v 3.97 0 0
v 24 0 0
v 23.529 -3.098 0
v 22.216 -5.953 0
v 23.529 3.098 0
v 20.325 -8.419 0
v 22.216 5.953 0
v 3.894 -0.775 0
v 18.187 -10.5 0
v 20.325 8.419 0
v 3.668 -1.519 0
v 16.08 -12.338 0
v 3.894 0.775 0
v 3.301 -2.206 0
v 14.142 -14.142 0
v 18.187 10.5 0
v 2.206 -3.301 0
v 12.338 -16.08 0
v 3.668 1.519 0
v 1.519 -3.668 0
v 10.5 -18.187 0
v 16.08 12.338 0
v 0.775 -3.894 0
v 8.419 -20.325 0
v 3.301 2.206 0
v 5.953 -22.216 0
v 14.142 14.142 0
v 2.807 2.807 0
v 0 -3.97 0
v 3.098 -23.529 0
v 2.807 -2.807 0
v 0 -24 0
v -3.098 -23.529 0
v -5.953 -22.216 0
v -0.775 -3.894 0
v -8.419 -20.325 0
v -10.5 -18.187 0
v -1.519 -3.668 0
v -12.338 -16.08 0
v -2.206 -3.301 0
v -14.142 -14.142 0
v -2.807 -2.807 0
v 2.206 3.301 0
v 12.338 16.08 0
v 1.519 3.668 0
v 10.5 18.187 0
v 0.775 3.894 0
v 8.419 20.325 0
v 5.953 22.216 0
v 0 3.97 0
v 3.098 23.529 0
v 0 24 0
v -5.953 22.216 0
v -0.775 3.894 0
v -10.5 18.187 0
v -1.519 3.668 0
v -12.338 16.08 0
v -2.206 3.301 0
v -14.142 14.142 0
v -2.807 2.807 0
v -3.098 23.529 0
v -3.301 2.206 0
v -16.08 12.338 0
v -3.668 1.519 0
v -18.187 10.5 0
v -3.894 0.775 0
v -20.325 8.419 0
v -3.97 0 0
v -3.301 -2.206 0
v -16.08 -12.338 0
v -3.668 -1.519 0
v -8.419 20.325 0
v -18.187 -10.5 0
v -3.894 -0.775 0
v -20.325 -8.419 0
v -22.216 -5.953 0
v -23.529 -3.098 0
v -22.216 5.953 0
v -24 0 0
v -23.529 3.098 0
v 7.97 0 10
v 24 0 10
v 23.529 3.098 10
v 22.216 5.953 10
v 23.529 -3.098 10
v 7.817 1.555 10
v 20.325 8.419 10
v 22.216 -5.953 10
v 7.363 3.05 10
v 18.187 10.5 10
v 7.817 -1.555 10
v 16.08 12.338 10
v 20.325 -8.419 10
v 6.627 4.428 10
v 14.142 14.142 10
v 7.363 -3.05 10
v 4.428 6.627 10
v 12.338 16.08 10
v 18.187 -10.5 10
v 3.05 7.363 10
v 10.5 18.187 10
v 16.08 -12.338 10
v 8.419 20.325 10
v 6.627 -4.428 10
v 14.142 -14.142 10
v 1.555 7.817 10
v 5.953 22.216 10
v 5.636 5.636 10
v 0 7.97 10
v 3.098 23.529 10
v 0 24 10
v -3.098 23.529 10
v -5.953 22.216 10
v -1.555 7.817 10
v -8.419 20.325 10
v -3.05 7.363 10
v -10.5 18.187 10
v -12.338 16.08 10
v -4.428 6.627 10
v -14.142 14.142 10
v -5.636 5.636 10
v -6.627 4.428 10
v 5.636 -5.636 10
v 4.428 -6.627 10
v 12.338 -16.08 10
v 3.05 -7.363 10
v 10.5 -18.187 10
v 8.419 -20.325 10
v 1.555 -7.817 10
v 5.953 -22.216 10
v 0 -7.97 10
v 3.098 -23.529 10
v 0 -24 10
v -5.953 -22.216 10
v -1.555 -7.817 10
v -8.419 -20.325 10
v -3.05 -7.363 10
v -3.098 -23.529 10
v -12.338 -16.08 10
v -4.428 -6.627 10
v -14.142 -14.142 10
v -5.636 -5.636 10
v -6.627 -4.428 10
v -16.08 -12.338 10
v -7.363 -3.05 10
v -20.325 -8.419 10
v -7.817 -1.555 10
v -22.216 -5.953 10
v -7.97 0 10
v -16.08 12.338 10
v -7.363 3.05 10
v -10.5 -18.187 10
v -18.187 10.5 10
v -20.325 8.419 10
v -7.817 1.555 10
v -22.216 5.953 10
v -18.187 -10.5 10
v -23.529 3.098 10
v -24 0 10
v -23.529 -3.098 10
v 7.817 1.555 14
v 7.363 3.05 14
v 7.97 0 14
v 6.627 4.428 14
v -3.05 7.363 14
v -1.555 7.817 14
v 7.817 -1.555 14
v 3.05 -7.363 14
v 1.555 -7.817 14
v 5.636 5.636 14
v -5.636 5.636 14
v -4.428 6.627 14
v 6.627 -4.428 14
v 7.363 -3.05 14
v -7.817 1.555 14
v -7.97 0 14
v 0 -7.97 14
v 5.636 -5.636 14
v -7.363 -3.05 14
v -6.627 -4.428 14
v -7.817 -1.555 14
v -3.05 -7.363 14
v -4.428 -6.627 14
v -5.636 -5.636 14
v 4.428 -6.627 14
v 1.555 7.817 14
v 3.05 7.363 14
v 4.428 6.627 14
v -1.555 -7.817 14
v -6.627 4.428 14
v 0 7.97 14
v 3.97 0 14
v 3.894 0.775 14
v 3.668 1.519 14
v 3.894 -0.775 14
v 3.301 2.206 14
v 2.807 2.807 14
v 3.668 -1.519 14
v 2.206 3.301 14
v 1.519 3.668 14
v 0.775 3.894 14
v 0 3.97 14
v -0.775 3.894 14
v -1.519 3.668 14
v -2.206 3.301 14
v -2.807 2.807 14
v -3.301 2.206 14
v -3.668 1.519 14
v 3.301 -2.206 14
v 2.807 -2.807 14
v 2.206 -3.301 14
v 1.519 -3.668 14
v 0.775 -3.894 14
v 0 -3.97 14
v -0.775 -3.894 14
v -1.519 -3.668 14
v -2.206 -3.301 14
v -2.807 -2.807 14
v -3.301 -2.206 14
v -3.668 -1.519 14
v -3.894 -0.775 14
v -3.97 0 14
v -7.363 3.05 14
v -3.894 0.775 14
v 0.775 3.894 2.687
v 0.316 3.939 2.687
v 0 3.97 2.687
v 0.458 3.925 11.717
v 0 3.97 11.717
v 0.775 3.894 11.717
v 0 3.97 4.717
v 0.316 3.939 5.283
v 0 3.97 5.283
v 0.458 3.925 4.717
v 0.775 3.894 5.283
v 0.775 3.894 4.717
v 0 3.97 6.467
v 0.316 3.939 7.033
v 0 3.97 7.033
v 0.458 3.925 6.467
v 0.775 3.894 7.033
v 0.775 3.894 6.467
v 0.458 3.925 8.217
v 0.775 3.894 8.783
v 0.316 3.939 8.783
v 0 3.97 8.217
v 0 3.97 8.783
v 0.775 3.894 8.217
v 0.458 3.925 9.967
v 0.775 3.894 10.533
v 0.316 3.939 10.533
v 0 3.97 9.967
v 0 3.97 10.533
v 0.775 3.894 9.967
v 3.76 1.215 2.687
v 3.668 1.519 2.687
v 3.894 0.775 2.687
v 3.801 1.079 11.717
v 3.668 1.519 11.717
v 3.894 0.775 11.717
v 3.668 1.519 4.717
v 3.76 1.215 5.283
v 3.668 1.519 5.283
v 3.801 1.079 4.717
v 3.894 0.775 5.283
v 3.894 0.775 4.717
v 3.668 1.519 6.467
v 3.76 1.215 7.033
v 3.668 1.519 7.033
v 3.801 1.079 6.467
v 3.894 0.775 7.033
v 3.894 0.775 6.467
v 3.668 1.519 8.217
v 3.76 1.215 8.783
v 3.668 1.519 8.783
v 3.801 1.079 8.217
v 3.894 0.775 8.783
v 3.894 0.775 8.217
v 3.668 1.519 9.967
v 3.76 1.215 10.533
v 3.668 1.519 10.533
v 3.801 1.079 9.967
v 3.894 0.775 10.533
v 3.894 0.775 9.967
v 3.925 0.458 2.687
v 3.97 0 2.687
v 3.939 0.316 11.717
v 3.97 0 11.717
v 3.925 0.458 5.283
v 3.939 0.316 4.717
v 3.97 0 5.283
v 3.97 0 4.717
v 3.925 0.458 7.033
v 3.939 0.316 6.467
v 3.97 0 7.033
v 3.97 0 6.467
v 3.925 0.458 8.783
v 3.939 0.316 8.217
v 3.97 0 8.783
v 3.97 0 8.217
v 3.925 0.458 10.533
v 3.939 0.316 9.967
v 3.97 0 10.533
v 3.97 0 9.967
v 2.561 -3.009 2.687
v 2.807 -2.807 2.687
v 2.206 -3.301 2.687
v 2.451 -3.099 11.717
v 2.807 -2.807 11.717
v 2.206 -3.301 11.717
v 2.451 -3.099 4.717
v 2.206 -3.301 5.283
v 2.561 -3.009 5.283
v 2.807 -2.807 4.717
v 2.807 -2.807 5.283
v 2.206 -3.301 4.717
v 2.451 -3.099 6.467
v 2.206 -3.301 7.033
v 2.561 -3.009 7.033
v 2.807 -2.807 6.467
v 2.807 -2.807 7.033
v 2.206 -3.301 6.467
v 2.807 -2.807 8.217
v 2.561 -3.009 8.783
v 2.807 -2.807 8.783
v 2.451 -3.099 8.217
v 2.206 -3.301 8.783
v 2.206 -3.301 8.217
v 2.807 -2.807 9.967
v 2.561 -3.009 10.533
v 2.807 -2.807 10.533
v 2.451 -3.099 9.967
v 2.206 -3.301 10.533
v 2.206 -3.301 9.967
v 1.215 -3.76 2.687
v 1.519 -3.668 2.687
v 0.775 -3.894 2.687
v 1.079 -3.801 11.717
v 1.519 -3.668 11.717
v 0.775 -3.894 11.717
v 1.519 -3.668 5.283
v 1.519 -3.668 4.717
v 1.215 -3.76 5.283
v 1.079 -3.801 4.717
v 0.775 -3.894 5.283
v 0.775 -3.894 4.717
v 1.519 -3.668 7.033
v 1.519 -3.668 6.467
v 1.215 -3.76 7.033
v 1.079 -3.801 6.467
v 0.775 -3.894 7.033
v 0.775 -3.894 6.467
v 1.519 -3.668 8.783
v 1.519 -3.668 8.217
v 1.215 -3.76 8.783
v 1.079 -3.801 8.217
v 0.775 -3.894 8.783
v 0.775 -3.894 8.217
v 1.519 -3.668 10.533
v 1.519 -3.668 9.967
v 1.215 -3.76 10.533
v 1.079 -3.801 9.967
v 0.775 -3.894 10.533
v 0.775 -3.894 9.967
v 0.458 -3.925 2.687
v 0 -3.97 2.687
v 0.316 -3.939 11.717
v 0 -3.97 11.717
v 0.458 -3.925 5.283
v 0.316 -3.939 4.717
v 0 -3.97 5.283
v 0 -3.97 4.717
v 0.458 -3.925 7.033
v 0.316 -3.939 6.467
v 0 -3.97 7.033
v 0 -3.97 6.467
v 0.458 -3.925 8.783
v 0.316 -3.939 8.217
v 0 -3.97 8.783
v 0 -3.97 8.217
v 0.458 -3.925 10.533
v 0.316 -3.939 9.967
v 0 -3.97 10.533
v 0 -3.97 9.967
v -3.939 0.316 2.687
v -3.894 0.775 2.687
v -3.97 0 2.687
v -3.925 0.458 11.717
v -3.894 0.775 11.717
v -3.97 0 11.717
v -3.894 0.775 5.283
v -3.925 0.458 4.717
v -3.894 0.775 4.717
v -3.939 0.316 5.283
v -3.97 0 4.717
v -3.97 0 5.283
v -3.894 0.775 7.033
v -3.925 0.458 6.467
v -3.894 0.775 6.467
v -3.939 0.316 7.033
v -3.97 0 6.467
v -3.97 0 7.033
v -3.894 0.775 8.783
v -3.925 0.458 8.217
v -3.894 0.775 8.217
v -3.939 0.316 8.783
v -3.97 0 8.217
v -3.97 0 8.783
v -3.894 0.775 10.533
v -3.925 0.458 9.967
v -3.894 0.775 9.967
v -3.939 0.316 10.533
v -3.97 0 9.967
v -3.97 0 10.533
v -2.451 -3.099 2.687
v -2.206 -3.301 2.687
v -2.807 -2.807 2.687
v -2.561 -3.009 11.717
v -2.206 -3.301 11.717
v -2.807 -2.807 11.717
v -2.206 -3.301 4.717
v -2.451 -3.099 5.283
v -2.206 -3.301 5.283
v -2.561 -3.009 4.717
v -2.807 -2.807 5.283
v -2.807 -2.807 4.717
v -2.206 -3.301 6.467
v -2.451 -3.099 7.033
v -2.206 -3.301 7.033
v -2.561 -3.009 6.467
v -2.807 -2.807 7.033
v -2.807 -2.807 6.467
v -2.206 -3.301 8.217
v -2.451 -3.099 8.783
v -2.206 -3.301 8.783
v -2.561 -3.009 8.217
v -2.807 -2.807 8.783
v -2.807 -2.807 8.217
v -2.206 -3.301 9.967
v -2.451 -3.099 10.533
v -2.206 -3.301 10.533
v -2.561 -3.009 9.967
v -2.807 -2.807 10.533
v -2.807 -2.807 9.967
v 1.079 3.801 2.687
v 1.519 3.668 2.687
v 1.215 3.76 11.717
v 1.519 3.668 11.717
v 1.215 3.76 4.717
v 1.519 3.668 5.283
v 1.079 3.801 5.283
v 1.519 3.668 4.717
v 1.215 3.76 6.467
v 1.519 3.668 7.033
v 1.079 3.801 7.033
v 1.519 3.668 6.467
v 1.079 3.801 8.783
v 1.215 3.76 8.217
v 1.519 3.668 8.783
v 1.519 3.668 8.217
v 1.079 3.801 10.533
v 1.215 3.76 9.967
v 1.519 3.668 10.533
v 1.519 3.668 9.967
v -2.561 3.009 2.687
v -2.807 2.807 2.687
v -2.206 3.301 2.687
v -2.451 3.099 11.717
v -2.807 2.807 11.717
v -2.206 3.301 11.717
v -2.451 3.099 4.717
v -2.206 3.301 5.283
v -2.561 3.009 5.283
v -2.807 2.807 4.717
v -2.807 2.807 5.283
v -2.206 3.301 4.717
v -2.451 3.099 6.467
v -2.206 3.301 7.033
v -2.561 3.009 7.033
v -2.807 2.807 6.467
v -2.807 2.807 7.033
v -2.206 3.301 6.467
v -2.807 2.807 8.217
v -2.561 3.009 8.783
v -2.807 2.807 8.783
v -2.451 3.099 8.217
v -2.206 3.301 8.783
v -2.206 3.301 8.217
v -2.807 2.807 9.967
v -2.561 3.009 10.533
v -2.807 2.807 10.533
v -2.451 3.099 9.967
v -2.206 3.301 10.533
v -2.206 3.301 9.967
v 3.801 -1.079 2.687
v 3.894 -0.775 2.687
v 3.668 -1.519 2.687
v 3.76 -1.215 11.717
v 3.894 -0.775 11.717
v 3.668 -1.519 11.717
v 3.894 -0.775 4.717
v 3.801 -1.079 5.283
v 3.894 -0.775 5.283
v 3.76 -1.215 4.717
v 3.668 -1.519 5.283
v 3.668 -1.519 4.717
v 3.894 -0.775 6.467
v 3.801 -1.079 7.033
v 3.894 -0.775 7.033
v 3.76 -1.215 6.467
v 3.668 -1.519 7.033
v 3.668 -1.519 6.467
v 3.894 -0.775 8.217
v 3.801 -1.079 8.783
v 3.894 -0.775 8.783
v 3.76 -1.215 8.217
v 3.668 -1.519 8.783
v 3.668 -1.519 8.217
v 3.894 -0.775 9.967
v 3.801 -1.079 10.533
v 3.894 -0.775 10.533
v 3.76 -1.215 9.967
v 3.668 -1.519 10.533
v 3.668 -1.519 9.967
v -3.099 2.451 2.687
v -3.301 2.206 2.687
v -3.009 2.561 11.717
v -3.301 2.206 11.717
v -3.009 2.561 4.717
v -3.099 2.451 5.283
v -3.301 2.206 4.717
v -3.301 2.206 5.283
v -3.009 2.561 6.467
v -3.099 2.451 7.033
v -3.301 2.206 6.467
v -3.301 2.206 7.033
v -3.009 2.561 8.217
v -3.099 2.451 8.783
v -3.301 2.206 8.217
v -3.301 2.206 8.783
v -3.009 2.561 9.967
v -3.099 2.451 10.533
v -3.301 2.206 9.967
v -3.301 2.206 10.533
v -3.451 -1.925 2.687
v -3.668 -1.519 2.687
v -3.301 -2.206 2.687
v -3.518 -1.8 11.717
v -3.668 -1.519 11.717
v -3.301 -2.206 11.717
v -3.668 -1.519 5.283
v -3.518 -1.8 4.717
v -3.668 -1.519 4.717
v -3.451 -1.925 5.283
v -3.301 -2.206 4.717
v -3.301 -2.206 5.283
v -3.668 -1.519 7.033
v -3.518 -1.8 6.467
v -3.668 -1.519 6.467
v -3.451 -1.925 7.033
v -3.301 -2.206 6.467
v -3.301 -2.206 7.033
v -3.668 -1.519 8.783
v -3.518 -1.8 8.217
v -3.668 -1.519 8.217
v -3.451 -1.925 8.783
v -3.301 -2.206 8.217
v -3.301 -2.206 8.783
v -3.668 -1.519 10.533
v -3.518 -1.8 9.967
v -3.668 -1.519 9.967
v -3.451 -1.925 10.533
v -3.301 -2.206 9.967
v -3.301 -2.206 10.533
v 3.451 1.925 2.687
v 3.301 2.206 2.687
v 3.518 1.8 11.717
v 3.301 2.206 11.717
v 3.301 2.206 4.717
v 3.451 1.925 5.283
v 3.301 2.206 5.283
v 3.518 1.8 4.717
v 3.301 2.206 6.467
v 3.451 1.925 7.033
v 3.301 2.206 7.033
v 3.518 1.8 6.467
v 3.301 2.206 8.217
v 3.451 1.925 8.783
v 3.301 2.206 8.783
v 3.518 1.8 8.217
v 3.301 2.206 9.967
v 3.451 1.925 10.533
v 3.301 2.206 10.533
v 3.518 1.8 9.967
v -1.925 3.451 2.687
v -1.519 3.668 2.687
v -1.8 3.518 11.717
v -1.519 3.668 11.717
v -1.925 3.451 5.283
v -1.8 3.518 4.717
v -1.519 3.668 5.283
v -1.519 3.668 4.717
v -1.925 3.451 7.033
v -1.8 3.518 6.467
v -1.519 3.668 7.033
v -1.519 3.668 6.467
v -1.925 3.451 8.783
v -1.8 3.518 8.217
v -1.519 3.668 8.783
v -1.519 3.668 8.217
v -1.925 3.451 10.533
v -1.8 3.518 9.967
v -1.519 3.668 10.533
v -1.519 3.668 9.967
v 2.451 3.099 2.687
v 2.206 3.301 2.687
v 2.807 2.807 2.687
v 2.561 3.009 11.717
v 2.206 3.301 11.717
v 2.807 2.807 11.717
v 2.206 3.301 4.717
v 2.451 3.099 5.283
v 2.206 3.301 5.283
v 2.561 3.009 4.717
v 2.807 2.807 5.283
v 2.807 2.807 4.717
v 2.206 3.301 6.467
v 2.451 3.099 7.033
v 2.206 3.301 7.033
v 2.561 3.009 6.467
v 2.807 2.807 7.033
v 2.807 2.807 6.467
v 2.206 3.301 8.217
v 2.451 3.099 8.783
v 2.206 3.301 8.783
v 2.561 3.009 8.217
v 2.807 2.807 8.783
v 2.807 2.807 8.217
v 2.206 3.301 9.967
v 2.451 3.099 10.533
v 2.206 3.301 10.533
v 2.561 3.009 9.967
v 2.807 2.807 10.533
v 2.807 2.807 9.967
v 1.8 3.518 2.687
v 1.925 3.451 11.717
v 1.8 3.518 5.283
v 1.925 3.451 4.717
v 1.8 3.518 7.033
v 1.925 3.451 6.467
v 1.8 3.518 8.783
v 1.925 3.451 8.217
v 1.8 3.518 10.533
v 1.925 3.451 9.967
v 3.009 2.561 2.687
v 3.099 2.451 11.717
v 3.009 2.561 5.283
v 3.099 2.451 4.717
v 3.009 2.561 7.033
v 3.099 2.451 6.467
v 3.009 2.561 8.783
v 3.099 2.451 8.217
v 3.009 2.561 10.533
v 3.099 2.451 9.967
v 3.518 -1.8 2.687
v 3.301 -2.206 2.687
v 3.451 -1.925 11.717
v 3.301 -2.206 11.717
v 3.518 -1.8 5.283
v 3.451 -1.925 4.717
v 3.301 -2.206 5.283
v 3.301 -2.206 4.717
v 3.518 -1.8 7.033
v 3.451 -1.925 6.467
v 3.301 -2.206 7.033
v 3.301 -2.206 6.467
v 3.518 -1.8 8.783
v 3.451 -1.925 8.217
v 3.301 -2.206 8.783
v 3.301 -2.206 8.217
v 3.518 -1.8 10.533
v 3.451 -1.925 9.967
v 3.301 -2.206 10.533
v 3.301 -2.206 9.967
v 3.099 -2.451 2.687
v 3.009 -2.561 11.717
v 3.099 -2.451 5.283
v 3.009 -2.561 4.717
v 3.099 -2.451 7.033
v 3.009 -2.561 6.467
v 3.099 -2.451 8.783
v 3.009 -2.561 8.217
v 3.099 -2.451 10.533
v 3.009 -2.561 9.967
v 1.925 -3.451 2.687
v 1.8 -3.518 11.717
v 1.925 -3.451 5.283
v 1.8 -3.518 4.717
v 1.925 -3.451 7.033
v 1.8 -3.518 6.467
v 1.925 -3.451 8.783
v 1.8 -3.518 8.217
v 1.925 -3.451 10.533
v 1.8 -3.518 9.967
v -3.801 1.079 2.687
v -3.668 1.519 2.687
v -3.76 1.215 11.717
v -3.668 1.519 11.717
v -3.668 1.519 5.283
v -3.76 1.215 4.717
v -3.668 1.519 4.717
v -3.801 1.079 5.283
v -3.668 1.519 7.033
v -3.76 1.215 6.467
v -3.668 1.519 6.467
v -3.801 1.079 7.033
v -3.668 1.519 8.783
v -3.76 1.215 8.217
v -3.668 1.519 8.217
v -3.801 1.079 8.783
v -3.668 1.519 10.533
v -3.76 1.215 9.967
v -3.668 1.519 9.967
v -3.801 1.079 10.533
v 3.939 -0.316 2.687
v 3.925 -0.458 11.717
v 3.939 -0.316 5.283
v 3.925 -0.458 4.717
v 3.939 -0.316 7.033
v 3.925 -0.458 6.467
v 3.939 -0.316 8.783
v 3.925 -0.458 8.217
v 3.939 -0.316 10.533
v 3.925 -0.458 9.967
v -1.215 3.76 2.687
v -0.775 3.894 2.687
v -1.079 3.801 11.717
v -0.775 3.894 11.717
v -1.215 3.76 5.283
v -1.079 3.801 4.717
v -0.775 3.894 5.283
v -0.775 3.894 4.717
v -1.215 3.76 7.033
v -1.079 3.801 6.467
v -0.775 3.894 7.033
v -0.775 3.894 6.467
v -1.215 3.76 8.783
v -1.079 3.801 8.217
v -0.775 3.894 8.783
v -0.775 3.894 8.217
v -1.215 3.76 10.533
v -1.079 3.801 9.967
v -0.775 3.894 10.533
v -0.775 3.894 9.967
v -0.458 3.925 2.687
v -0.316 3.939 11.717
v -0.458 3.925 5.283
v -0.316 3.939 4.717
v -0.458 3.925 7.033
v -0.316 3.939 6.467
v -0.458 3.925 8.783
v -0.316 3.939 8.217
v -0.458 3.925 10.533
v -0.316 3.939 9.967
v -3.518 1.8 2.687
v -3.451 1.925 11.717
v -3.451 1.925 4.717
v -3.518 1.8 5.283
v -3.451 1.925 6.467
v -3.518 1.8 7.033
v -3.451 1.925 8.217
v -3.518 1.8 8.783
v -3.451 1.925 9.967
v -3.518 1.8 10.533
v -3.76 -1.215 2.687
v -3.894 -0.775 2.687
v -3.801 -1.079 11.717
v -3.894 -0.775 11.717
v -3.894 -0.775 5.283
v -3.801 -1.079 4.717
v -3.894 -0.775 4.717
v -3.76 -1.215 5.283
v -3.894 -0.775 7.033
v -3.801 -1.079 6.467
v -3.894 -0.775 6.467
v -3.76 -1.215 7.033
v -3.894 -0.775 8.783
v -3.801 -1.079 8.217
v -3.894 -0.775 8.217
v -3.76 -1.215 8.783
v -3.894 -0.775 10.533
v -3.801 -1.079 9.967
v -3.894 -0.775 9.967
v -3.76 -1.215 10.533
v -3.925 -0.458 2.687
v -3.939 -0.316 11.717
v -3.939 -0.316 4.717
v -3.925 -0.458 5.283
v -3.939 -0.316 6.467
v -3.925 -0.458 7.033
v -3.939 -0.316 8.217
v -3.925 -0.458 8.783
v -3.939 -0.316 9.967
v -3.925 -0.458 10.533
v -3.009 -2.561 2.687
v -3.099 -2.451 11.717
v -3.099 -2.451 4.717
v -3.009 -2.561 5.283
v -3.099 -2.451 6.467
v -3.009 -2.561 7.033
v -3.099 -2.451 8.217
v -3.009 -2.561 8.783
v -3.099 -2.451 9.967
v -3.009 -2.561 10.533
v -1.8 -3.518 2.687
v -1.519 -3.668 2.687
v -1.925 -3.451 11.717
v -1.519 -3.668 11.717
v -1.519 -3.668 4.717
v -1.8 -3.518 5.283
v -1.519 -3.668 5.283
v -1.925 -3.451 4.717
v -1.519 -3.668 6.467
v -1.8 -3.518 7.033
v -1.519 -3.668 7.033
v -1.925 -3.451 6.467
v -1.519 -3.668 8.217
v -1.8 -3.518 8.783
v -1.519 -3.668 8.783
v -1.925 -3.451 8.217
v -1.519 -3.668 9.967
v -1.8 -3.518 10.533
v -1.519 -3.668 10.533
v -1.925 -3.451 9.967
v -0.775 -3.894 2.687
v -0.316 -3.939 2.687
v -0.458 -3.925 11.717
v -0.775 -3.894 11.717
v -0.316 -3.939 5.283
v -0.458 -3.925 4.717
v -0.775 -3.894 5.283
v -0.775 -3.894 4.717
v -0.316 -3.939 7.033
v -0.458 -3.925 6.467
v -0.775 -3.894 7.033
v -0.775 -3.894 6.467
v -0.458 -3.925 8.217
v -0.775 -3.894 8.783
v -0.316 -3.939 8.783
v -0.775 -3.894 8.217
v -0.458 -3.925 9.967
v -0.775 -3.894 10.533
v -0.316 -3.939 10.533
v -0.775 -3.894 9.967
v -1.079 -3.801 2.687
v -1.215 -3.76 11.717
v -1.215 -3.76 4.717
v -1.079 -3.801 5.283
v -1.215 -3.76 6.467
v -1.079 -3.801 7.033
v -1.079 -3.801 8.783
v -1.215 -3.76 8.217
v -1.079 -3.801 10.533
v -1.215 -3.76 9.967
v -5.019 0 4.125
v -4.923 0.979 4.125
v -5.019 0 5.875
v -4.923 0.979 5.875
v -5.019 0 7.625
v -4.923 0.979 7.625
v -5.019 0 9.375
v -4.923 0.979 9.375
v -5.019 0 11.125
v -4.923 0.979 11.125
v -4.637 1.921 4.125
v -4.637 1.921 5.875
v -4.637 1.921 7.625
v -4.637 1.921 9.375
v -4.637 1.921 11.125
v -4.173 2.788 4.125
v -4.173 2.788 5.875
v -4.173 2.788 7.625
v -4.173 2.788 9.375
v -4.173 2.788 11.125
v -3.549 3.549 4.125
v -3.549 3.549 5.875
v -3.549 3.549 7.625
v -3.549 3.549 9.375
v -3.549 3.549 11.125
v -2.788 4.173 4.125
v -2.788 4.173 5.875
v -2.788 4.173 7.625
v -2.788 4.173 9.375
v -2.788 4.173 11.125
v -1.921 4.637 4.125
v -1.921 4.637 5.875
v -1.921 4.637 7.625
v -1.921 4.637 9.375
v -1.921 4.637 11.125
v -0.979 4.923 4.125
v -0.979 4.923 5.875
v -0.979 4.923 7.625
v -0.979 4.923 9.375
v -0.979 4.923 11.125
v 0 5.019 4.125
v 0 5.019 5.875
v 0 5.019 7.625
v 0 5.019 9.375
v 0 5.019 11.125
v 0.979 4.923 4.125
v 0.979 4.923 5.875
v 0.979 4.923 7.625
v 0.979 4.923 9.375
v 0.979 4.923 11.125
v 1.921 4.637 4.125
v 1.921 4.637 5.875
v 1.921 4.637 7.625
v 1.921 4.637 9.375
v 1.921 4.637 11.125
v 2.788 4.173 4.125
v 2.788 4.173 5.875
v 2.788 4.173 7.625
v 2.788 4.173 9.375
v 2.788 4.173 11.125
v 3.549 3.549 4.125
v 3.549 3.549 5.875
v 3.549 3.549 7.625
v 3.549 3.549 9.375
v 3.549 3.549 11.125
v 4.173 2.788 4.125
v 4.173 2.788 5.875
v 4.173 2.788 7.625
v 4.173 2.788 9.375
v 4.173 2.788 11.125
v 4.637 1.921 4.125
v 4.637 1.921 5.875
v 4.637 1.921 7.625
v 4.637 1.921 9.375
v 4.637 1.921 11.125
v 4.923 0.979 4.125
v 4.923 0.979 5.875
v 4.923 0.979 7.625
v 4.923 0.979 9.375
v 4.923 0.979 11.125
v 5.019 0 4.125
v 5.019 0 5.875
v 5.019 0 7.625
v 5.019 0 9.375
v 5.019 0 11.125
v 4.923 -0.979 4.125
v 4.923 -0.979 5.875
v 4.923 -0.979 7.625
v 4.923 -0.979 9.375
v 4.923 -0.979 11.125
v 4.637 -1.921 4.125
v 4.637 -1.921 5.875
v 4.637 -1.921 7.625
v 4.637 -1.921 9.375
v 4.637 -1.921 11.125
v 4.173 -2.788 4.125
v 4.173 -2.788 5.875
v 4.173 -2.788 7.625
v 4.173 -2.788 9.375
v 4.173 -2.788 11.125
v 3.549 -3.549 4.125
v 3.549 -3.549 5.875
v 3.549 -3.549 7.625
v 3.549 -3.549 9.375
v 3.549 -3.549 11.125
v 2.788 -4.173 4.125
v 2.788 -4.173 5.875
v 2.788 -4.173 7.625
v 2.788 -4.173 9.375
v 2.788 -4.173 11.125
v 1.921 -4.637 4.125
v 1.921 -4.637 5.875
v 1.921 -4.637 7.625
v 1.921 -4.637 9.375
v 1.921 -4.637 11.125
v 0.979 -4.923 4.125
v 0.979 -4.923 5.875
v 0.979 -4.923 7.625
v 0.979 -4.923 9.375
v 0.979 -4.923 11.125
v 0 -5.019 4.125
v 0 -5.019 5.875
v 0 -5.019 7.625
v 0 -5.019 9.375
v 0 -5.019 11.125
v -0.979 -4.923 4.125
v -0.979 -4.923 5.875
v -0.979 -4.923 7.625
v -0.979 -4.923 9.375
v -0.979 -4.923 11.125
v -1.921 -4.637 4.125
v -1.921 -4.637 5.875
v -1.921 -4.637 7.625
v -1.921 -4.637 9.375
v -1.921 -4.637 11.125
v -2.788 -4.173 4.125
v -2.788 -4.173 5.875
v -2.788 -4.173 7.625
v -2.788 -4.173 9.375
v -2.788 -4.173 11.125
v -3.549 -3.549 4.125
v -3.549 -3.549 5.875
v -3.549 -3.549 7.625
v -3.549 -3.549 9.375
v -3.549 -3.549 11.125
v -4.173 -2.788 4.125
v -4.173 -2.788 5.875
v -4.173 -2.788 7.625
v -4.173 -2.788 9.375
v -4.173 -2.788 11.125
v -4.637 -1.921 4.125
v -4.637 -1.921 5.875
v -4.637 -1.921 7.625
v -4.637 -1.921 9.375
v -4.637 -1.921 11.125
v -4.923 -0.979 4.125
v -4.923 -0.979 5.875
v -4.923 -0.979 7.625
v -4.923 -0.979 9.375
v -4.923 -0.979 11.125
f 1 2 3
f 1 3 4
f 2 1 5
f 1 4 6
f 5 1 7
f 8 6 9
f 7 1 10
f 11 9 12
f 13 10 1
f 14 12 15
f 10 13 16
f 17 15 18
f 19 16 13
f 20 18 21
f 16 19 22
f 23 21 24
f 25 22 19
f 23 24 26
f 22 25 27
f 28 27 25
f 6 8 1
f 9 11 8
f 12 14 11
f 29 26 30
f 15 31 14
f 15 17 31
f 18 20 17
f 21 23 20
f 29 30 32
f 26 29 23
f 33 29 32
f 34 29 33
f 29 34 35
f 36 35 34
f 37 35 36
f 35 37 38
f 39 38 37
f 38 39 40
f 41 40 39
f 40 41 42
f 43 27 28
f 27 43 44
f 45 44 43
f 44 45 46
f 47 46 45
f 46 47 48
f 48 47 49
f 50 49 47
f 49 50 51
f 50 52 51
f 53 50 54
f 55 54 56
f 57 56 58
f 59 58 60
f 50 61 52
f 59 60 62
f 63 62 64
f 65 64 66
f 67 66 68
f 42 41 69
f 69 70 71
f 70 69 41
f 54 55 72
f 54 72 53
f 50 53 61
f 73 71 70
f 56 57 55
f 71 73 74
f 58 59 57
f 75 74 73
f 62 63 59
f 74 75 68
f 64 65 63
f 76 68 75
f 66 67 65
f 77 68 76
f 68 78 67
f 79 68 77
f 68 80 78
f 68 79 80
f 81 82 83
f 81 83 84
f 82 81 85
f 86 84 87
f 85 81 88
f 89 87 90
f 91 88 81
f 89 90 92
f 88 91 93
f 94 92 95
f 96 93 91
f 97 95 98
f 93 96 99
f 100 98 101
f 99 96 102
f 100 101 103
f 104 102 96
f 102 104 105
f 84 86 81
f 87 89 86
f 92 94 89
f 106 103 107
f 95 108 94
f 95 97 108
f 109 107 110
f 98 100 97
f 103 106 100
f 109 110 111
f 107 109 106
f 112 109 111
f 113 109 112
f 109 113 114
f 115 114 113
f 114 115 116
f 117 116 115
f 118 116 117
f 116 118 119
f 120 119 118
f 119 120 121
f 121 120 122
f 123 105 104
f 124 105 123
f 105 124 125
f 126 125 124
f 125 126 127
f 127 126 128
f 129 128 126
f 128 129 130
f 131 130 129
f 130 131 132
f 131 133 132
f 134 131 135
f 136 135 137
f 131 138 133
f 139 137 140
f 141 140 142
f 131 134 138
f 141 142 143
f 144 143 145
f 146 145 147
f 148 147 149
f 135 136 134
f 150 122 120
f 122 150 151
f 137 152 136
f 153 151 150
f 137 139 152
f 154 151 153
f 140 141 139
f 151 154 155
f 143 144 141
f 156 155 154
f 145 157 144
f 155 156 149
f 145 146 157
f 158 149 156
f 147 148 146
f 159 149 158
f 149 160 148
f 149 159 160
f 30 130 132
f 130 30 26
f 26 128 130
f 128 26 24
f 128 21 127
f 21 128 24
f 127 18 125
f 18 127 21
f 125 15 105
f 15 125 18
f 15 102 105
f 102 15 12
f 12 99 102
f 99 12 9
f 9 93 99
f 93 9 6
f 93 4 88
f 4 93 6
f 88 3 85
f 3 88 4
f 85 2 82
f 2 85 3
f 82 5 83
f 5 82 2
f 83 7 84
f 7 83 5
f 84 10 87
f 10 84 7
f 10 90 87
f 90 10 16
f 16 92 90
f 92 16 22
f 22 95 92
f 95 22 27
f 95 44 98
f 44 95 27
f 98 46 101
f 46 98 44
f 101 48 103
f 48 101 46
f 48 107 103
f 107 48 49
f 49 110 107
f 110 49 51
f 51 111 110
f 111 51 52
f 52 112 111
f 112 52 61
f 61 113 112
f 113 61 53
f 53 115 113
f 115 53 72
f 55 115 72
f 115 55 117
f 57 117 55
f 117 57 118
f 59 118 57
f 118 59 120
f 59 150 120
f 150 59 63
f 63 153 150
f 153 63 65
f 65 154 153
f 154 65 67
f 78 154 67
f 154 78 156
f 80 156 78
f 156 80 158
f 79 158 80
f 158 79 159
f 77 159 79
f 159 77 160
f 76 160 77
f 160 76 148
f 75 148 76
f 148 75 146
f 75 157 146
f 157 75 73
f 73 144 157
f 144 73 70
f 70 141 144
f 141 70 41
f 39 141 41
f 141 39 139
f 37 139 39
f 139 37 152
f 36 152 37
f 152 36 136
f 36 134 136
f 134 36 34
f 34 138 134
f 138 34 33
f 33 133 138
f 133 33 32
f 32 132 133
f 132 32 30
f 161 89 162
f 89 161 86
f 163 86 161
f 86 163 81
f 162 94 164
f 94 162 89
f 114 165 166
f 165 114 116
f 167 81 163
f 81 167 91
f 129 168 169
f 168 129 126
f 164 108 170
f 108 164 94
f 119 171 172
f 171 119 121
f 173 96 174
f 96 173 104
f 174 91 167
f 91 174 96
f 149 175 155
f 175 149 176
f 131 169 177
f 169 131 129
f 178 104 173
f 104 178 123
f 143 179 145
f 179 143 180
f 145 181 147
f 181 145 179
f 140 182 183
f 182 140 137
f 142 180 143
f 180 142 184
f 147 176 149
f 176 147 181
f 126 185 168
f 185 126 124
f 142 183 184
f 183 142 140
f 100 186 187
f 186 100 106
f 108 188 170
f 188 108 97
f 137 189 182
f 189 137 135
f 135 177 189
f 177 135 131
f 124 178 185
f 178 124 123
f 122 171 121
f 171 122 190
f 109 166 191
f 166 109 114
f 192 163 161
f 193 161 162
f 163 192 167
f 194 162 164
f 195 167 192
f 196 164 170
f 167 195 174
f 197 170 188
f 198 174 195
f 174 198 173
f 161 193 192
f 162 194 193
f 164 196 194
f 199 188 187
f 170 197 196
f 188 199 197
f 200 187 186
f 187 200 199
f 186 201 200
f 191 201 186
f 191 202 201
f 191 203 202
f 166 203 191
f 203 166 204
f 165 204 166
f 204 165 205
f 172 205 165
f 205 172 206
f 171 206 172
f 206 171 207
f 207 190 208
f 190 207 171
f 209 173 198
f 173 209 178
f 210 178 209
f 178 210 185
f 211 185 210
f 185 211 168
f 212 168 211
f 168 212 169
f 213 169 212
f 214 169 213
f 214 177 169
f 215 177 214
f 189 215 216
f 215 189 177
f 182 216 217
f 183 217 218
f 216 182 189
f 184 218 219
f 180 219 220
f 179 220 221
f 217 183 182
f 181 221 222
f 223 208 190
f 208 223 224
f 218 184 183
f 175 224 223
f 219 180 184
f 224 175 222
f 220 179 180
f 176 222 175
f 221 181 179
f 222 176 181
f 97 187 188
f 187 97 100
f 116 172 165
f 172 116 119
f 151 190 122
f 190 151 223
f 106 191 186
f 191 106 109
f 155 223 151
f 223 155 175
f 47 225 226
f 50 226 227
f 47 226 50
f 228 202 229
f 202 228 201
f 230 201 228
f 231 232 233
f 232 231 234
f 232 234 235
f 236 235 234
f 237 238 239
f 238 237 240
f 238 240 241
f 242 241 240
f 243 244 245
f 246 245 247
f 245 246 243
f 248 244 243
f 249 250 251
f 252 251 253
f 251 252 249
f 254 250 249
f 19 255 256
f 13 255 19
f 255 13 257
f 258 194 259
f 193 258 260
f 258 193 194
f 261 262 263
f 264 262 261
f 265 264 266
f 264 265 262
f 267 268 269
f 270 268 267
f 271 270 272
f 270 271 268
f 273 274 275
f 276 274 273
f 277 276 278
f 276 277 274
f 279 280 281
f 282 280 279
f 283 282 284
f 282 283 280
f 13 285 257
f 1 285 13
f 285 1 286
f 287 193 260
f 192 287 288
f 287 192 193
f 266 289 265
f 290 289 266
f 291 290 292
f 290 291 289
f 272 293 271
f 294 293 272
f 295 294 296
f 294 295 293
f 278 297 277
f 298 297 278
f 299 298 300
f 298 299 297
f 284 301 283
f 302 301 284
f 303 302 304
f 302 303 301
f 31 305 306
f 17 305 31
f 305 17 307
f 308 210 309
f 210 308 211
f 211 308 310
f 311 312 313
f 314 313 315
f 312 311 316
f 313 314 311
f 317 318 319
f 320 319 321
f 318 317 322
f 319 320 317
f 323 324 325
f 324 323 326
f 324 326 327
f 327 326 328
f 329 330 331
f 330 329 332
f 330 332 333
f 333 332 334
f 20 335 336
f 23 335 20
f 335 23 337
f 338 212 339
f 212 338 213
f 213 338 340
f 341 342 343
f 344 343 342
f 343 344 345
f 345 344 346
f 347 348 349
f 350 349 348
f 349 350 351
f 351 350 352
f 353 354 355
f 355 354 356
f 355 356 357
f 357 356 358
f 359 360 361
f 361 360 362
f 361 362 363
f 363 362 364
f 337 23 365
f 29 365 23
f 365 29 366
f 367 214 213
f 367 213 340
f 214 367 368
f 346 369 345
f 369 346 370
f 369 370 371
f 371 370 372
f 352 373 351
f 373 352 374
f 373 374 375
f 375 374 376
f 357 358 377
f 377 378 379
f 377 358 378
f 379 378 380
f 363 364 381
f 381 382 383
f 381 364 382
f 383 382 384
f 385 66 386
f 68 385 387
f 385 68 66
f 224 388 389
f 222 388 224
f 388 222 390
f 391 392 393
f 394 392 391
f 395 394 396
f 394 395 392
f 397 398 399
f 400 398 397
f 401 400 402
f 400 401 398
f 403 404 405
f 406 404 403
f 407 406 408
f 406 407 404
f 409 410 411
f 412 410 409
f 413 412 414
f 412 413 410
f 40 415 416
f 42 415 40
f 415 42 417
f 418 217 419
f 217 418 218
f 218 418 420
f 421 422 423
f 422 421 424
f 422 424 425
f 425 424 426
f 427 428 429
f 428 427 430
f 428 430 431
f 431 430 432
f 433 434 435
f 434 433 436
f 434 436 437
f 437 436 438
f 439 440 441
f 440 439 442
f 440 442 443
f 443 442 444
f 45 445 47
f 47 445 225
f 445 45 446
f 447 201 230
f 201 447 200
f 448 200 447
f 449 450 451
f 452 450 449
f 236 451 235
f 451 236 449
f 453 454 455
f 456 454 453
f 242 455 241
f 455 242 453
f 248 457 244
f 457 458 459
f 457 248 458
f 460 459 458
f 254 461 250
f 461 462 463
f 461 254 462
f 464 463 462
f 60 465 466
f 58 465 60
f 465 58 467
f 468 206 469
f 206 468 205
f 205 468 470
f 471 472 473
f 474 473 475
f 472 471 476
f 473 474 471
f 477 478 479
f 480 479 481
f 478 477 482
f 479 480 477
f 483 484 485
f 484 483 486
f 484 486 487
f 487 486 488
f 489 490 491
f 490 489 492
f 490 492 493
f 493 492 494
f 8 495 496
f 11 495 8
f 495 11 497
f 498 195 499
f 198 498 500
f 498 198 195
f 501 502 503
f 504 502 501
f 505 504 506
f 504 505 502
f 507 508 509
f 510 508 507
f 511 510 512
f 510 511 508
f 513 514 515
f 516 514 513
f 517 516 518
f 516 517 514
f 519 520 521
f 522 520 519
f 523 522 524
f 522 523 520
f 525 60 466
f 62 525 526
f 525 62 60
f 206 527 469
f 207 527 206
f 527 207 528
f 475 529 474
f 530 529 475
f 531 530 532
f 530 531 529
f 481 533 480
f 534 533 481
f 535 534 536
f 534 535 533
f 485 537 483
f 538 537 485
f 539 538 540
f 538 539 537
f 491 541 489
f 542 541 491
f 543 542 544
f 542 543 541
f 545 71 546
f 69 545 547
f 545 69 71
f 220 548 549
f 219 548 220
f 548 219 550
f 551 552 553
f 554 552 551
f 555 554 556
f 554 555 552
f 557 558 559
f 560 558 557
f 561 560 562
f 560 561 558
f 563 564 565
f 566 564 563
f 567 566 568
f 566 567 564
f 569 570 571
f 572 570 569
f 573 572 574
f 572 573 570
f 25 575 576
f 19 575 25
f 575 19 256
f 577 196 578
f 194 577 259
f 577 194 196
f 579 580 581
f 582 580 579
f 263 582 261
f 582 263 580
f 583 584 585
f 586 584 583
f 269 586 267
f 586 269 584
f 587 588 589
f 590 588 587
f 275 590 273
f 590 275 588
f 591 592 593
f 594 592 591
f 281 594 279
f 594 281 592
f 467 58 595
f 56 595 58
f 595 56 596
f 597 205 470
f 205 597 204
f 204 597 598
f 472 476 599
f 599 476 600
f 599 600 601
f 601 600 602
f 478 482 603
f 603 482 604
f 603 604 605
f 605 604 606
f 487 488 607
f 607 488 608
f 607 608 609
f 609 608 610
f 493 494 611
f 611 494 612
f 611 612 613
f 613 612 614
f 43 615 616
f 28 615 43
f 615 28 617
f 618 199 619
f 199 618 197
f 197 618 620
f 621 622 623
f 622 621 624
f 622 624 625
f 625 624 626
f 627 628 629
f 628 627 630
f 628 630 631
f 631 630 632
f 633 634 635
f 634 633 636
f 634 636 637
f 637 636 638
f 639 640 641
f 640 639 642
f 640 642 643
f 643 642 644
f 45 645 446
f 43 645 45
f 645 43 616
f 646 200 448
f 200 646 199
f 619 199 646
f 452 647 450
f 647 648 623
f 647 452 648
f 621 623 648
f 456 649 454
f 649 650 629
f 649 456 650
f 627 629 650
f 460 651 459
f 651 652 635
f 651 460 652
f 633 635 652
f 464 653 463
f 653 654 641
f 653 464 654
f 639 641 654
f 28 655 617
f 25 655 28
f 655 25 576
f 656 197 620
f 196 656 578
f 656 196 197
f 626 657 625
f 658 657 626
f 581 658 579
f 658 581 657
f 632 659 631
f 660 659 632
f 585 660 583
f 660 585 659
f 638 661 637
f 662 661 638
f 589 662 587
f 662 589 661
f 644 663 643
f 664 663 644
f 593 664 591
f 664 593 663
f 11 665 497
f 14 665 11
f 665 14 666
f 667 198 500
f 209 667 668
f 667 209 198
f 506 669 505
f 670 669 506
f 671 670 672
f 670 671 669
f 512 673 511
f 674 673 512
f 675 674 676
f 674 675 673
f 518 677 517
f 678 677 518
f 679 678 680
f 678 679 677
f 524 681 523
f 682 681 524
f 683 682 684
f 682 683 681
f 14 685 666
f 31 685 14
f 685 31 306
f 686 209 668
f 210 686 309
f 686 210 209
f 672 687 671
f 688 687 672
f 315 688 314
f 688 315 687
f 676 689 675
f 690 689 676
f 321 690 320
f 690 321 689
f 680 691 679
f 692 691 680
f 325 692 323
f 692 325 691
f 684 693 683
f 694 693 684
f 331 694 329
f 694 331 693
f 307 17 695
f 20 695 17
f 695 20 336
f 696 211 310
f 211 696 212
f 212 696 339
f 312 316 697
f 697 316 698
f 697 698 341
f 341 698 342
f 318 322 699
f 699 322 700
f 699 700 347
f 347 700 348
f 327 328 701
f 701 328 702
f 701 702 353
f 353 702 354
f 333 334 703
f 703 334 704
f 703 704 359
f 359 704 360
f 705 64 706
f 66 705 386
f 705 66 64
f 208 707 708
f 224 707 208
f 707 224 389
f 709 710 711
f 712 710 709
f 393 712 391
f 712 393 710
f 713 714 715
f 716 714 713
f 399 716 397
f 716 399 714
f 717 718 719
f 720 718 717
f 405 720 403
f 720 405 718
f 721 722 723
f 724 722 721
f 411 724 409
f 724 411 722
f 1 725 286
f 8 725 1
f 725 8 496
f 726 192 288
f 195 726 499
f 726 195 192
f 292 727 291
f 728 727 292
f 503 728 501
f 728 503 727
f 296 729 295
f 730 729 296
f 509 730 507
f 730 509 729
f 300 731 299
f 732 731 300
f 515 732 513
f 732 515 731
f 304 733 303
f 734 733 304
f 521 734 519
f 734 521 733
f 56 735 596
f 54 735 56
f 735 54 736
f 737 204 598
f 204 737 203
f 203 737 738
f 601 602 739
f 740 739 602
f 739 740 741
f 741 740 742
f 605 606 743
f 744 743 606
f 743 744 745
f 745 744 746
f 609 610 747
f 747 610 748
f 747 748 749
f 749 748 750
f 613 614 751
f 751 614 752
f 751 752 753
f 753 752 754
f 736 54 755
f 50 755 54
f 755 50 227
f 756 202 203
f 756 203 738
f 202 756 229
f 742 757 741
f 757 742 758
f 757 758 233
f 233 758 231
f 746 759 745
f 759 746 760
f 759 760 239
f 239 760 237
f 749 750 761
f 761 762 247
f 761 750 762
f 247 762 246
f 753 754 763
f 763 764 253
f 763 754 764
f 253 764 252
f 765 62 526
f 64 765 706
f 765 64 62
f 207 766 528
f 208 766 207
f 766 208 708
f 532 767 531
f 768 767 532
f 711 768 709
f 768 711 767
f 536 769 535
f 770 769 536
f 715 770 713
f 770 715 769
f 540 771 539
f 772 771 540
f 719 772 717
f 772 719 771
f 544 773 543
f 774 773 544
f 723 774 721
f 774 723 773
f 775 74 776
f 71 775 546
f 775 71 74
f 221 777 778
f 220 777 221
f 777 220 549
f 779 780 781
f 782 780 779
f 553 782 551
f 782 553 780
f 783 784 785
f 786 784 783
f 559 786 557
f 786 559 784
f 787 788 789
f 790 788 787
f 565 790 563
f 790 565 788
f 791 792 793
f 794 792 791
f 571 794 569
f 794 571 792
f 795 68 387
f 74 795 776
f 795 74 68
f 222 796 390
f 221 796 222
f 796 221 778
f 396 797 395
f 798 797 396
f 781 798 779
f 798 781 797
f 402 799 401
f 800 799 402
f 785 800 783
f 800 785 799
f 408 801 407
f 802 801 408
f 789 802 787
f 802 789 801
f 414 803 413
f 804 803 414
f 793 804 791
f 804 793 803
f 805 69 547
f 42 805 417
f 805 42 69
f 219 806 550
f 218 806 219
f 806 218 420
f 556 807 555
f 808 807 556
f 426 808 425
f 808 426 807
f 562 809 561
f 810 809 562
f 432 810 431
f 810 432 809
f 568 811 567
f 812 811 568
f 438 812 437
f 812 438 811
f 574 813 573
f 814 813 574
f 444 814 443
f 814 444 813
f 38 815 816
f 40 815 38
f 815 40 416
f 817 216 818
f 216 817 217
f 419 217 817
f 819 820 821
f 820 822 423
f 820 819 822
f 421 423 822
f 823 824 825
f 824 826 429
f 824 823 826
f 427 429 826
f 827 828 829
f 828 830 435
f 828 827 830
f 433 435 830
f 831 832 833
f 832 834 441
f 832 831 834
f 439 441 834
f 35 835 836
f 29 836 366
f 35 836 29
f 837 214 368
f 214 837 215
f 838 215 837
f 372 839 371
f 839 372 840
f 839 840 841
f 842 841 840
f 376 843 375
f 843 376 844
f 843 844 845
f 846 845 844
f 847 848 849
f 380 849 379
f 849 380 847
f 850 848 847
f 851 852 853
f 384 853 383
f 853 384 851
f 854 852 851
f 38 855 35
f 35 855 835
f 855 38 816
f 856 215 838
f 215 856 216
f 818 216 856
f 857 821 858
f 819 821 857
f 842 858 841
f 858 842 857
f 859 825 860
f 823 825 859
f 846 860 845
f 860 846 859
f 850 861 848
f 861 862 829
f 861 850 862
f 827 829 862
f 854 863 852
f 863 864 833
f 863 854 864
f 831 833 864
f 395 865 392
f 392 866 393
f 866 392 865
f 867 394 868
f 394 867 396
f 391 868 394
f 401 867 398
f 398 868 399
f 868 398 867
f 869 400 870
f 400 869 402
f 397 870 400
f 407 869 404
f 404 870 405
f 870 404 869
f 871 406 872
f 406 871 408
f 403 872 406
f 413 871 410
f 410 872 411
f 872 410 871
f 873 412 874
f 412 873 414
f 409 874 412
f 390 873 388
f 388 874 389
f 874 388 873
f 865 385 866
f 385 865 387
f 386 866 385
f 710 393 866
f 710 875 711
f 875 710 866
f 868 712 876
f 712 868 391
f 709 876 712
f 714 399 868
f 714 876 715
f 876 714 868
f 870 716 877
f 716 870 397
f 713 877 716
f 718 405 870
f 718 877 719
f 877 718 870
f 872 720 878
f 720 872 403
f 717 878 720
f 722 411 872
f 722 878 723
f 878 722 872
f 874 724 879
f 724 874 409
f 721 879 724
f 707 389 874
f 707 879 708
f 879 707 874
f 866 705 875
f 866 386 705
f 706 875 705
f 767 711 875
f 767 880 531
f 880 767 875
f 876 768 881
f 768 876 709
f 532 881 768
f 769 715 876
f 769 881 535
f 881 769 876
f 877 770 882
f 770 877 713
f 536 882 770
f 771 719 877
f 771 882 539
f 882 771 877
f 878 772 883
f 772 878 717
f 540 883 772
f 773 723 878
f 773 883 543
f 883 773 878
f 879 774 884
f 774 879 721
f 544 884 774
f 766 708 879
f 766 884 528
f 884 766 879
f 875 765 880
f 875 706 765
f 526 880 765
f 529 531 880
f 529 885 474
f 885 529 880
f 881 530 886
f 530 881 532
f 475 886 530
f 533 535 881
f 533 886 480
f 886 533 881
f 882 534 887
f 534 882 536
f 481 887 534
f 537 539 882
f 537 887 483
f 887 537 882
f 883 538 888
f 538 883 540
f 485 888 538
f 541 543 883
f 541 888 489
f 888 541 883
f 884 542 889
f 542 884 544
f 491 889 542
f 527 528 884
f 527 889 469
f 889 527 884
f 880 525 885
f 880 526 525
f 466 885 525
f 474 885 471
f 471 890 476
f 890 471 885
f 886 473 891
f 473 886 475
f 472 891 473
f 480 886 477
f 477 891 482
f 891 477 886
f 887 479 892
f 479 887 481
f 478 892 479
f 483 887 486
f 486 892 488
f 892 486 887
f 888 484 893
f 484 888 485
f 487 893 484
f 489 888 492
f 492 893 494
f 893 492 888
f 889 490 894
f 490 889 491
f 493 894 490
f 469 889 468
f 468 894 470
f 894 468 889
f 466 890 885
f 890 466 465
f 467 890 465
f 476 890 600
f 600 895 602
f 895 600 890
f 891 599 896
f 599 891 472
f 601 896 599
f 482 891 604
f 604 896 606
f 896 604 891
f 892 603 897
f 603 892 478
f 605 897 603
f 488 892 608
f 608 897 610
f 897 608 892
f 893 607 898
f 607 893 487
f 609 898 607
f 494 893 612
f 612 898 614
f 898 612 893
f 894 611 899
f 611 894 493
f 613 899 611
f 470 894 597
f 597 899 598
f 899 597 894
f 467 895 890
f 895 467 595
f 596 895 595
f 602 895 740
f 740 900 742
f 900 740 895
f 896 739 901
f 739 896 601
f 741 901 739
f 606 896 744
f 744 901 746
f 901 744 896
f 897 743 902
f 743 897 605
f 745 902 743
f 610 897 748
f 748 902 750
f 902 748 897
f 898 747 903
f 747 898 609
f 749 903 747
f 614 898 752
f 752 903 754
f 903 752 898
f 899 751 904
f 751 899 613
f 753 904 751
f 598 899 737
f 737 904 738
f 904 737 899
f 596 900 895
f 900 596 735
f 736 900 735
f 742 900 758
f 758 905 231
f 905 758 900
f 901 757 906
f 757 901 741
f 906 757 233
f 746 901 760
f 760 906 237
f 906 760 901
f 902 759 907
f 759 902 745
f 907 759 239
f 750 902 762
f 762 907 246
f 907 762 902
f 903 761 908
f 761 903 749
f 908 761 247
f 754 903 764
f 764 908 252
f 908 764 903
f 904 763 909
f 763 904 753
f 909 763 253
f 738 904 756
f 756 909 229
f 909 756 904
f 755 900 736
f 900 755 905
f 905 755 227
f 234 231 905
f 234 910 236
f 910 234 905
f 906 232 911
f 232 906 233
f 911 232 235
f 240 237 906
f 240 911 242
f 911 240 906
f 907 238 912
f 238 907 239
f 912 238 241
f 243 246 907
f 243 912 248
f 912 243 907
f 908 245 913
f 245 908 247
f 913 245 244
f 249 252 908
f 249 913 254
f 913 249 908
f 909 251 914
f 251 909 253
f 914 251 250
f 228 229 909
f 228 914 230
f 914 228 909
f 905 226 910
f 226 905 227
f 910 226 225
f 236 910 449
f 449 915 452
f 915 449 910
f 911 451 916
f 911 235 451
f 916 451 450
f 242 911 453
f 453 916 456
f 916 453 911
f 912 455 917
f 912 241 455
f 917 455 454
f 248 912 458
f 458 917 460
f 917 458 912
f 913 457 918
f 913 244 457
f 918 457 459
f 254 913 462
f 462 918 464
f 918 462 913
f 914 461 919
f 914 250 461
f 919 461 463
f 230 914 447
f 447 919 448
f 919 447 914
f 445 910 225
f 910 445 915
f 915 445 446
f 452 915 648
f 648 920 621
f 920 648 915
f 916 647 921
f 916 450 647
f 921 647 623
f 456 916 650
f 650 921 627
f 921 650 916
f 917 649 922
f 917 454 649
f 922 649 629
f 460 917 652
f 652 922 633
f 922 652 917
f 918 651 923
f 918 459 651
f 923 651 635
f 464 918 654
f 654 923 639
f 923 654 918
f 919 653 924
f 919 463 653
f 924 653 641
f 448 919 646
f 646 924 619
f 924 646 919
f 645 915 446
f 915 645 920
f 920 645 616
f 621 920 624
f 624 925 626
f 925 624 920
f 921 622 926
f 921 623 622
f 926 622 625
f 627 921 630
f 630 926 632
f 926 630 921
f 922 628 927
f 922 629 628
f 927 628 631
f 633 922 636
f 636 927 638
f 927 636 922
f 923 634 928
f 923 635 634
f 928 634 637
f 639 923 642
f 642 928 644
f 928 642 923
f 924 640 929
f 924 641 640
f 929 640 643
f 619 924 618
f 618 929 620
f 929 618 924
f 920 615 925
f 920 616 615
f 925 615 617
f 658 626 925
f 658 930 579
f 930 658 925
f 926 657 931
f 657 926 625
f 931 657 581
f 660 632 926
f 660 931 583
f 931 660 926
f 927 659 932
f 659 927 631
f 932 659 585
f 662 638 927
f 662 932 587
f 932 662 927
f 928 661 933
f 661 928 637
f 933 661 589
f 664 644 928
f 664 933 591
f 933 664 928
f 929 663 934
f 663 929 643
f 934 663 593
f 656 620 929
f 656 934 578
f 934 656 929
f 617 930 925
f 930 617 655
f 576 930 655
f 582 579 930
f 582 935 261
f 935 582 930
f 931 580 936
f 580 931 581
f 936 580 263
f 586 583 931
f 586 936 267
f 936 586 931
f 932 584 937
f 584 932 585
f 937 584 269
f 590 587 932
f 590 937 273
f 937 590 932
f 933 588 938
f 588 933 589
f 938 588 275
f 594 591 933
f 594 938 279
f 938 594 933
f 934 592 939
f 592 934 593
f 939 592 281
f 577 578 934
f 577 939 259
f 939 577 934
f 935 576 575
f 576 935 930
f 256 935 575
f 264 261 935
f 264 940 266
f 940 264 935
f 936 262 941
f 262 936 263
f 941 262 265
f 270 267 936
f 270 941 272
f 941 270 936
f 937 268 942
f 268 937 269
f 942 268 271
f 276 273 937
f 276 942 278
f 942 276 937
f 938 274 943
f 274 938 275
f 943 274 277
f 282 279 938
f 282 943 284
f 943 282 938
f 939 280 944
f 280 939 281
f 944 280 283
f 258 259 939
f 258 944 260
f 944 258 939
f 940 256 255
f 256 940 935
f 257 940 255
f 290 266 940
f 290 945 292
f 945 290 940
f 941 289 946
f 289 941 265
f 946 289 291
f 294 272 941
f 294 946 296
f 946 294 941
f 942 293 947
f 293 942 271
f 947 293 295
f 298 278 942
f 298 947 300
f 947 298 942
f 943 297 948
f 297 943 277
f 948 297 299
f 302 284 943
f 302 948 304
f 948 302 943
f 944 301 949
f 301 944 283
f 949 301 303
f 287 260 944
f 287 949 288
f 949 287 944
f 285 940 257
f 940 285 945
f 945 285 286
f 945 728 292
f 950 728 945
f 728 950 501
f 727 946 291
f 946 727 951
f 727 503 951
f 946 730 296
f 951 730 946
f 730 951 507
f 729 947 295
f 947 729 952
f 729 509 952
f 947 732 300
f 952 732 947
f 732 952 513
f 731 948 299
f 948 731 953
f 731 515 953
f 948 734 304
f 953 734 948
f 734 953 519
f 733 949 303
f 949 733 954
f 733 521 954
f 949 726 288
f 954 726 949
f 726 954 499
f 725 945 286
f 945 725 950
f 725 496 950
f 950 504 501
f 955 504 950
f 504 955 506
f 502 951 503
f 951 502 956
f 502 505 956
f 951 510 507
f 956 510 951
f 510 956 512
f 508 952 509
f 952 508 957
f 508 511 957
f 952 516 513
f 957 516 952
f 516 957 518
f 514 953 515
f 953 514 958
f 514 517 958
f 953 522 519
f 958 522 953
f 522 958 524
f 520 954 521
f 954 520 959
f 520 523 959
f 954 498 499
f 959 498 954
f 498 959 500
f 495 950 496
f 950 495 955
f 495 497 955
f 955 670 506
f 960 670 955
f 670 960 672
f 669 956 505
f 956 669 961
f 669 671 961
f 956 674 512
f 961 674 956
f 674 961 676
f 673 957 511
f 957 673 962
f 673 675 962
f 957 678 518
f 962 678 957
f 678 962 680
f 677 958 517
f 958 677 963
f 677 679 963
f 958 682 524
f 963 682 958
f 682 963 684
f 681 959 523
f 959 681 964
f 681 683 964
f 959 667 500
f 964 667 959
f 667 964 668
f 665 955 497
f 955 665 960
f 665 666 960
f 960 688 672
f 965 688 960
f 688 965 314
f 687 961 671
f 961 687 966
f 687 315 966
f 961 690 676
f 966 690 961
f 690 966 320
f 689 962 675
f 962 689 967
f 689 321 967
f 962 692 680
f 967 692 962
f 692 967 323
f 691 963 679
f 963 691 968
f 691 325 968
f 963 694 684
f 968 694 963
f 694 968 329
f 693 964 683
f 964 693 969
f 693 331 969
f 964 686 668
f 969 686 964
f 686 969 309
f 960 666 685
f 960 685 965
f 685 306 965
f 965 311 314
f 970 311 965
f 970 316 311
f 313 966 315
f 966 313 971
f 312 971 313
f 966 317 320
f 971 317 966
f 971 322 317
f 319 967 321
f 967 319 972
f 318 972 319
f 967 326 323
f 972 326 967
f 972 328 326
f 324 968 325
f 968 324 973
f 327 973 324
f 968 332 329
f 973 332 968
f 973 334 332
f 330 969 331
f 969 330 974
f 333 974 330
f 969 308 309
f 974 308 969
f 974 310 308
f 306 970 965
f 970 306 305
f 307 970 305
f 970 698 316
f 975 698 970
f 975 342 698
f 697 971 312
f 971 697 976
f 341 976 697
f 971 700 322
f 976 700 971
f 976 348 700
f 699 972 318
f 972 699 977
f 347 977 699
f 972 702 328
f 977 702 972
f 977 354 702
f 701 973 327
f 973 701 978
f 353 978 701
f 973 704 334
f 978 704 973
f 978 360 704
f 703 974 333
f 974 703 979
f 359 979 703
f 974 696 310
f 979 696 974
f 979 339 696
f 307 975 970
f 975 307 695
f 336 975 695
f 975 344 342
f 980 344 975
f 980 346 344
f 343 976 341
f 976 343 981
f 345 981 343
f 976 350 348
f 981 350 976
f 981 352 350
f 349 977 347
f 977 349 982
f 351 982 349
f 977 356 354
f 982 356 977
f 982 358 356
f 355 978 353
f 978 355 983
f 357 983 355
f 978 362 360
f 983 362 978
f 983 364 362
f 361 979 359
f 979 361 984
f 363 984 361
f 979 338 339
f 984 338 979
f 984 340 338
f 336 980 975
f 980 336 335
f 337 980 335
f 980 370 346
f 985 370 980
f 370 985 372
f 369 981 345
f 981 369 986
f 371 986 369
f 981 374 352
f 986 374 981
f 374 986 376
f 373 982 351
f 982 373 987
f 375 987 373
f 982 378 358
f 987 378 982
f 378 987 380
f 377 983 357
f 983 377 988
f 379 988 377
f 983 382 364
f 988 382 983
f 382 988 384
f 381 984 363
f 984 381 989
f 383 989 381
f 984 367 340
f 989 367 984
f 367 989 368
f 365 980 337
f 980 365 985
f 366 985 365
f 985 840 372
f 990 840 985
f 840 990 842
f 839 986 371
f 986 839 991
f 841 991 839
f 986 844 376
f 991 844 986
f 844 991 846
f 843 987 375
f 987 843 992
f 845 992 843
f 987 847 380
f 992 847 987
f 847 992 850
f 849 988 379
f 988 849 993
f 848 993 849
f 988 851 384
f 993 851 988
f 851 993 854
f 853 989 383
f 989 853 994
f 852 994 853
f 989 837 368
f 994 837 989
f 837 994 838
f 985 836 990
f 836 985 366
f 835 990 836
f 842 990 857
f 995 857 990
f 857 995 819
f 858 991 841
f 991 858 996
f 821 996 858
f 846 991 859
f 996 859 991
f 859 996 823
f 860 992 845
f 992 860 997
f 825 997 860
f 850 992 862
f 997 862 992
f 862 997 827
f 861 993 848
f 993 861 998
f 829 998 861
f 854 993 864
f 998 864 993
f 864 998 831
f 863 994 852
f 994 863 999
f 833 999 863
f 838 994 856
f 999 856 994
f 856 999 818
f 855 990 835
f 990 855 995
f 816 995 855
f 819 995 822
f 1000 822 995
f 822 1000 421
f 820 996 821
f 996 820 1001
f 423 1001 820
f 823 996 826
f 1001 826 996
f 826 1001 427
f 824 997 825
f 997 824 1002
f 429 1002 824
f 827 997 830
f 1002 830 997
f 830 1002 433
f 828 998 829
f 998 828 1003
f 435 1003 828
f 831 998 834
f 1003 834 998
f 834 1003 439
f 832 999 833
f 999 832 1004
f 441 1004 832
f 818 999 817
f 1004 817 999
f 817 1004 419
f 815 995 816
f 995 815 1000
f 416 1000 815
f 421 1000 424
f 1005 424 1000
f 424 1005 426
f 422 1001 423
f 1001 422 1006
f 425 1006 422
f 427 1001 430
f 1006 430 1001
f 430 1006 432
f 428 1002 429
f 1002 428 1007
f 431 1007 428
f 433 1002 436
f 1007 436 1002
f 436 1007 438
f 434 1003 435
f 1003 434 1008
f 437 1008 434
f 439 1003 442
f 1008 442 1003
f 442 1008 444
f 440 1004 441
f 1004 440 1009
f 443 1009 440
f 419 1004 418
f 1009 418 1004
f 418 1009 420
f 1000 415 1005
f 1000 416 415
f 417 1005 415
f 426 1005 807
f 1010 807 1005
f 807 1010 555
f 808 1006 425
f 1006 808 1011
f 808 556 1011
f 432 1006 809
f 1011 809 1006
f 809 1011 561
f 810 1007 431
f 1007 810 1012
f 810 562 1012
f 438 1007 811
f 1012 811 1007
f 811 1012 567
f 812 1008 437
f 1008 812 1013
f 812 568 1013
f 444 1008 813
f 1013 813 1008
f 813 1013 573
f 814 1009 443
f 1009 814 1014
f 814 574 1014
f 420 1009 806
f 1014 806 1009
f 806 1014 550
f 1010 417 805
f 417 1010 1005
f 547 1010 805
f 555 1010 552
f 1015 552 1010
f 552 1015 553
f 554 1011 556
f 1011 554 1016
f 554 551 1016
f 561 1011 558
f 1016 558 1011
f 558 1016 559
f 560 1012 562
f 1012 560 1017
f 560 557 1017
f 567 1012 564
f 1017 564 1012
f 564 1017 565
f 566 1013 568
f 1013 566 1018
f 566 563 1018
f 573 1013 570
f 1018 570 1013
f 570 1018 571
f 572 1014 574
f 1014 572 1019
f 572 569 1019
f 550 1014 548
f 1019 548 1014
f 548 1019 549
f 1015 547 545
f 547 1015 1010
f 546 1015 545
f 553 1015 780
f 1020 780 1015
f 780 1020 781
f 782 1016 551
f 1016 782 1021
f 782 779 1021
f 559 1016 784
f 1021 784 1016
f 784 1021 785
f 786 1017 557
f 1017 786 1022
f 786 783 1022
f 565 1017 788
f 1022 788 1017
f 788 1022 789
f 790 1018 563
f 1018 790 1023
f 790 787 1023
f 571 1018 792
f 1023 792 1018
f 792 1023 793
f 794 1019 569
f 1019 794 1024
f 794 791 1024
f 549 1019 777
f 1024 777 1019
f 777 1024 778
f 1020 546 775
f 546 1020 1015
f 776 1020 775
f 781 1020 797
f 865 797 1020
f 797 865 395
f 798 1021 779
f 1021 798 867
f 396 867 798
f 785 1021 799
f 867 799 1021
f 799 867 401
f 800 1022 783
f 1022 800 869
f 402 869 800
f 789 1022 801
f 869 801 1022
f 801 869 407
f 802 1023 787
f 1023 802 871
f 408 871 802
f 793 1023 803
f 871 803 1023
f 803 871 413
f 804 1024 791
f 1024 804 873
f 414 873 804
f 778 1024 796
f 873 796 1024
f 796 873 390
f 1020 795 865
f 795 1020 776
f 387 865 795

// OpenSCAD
$fn = 32;

// ----------------------------------------------------------------------
// Thumb nut: 4 lobe grip, 14 mm tall, M7.94 thread
// ----------------------------------------------------------------------

// --- parameters (mm) ---
base_r = 22;              // grip base radius
lobe_amp = 2;             // lobe height above the base radius
lobes = 4;                // number of grip lobes
grip_h = 10;              // grip height
boss_d = 15.94;           // threaded boss diameter
boss_h = 4;               // boss height
bore_d = 7.94;            // thread core diameter
pitch = 1.75;             // thread pitch
thread_d = 1.05;          // thread depth

grip = [[24, 0], [23.529, 3.098], [22.216, 5.953], [20.325, 8.419], [18.187, 10.5], [16.08, 12.338], [14.142, 14.142], [12.338, 16.08], [10.5, 18.187], [8.419, 20.325], [5.953, 22.216], [3.098, 23.529], [0, 24], [-3.098, 23.529], [-5.953, 22.216], [-8.419, 20.325], [-10.5, 18.187], [-12.338, 16.08], [-14.142, 14.142], [-16.08, 12.338], [-18.187, 10.5], [-20.325, 8.419], [-22.216, 5.953], [-23.529, 3.098], [-24, 0], [-23.529, -3.098], [-22.216, -5.953], [-20.325, -8.419], [-18.187, -10.5], [-16.08, -12.338], [-14.142, -14.142], [-12.338, -16.08], [-10.5, -18.187], [-8.419, -20.325], [-5.953, -22.216], [-3.098, -23.529], [0, -24], [3.098, -23.529], [5.953, -22.216], [8.419, -20.325], [10.5, -18.187], [12.338, -16.08], [14.142, -14.142], [16.08, -12.338], [18.187, -10.5], [20.325, -8.419], [22.216, -5.953], [23.529, -3.098]];

difference() {
  union() {
    /* grip outline extruded straight up */
    linear_extrude(height = grip_h) polygon(grip);
    /* boss sunk half a millimetre into the grip */
    translate([0, 0, grip_h - 0.5]) cylinder(h = boss_h + 0.5, d = boss_d);
  }
  /* threaded bore through grip and boss */
  translate([0, 0, -2.5]) cylinder(h = grip_h + boss_h + 5, d = bore_d);
  translate([0, 0, 2.0]) rotate_extrude() polygon([[2.969, 0], [2.969, 10], [3.469, 10], [5.019, 9.125], [3.469, 8.25], [5.019, 7.375], [3.469, 6.5], [5.019, 5.625], [3.469, 4.75], [5.019, 3.875], [3.469, 3], [5.019, 2.125], [3.469, 0], [2.969, 0]]);
}
